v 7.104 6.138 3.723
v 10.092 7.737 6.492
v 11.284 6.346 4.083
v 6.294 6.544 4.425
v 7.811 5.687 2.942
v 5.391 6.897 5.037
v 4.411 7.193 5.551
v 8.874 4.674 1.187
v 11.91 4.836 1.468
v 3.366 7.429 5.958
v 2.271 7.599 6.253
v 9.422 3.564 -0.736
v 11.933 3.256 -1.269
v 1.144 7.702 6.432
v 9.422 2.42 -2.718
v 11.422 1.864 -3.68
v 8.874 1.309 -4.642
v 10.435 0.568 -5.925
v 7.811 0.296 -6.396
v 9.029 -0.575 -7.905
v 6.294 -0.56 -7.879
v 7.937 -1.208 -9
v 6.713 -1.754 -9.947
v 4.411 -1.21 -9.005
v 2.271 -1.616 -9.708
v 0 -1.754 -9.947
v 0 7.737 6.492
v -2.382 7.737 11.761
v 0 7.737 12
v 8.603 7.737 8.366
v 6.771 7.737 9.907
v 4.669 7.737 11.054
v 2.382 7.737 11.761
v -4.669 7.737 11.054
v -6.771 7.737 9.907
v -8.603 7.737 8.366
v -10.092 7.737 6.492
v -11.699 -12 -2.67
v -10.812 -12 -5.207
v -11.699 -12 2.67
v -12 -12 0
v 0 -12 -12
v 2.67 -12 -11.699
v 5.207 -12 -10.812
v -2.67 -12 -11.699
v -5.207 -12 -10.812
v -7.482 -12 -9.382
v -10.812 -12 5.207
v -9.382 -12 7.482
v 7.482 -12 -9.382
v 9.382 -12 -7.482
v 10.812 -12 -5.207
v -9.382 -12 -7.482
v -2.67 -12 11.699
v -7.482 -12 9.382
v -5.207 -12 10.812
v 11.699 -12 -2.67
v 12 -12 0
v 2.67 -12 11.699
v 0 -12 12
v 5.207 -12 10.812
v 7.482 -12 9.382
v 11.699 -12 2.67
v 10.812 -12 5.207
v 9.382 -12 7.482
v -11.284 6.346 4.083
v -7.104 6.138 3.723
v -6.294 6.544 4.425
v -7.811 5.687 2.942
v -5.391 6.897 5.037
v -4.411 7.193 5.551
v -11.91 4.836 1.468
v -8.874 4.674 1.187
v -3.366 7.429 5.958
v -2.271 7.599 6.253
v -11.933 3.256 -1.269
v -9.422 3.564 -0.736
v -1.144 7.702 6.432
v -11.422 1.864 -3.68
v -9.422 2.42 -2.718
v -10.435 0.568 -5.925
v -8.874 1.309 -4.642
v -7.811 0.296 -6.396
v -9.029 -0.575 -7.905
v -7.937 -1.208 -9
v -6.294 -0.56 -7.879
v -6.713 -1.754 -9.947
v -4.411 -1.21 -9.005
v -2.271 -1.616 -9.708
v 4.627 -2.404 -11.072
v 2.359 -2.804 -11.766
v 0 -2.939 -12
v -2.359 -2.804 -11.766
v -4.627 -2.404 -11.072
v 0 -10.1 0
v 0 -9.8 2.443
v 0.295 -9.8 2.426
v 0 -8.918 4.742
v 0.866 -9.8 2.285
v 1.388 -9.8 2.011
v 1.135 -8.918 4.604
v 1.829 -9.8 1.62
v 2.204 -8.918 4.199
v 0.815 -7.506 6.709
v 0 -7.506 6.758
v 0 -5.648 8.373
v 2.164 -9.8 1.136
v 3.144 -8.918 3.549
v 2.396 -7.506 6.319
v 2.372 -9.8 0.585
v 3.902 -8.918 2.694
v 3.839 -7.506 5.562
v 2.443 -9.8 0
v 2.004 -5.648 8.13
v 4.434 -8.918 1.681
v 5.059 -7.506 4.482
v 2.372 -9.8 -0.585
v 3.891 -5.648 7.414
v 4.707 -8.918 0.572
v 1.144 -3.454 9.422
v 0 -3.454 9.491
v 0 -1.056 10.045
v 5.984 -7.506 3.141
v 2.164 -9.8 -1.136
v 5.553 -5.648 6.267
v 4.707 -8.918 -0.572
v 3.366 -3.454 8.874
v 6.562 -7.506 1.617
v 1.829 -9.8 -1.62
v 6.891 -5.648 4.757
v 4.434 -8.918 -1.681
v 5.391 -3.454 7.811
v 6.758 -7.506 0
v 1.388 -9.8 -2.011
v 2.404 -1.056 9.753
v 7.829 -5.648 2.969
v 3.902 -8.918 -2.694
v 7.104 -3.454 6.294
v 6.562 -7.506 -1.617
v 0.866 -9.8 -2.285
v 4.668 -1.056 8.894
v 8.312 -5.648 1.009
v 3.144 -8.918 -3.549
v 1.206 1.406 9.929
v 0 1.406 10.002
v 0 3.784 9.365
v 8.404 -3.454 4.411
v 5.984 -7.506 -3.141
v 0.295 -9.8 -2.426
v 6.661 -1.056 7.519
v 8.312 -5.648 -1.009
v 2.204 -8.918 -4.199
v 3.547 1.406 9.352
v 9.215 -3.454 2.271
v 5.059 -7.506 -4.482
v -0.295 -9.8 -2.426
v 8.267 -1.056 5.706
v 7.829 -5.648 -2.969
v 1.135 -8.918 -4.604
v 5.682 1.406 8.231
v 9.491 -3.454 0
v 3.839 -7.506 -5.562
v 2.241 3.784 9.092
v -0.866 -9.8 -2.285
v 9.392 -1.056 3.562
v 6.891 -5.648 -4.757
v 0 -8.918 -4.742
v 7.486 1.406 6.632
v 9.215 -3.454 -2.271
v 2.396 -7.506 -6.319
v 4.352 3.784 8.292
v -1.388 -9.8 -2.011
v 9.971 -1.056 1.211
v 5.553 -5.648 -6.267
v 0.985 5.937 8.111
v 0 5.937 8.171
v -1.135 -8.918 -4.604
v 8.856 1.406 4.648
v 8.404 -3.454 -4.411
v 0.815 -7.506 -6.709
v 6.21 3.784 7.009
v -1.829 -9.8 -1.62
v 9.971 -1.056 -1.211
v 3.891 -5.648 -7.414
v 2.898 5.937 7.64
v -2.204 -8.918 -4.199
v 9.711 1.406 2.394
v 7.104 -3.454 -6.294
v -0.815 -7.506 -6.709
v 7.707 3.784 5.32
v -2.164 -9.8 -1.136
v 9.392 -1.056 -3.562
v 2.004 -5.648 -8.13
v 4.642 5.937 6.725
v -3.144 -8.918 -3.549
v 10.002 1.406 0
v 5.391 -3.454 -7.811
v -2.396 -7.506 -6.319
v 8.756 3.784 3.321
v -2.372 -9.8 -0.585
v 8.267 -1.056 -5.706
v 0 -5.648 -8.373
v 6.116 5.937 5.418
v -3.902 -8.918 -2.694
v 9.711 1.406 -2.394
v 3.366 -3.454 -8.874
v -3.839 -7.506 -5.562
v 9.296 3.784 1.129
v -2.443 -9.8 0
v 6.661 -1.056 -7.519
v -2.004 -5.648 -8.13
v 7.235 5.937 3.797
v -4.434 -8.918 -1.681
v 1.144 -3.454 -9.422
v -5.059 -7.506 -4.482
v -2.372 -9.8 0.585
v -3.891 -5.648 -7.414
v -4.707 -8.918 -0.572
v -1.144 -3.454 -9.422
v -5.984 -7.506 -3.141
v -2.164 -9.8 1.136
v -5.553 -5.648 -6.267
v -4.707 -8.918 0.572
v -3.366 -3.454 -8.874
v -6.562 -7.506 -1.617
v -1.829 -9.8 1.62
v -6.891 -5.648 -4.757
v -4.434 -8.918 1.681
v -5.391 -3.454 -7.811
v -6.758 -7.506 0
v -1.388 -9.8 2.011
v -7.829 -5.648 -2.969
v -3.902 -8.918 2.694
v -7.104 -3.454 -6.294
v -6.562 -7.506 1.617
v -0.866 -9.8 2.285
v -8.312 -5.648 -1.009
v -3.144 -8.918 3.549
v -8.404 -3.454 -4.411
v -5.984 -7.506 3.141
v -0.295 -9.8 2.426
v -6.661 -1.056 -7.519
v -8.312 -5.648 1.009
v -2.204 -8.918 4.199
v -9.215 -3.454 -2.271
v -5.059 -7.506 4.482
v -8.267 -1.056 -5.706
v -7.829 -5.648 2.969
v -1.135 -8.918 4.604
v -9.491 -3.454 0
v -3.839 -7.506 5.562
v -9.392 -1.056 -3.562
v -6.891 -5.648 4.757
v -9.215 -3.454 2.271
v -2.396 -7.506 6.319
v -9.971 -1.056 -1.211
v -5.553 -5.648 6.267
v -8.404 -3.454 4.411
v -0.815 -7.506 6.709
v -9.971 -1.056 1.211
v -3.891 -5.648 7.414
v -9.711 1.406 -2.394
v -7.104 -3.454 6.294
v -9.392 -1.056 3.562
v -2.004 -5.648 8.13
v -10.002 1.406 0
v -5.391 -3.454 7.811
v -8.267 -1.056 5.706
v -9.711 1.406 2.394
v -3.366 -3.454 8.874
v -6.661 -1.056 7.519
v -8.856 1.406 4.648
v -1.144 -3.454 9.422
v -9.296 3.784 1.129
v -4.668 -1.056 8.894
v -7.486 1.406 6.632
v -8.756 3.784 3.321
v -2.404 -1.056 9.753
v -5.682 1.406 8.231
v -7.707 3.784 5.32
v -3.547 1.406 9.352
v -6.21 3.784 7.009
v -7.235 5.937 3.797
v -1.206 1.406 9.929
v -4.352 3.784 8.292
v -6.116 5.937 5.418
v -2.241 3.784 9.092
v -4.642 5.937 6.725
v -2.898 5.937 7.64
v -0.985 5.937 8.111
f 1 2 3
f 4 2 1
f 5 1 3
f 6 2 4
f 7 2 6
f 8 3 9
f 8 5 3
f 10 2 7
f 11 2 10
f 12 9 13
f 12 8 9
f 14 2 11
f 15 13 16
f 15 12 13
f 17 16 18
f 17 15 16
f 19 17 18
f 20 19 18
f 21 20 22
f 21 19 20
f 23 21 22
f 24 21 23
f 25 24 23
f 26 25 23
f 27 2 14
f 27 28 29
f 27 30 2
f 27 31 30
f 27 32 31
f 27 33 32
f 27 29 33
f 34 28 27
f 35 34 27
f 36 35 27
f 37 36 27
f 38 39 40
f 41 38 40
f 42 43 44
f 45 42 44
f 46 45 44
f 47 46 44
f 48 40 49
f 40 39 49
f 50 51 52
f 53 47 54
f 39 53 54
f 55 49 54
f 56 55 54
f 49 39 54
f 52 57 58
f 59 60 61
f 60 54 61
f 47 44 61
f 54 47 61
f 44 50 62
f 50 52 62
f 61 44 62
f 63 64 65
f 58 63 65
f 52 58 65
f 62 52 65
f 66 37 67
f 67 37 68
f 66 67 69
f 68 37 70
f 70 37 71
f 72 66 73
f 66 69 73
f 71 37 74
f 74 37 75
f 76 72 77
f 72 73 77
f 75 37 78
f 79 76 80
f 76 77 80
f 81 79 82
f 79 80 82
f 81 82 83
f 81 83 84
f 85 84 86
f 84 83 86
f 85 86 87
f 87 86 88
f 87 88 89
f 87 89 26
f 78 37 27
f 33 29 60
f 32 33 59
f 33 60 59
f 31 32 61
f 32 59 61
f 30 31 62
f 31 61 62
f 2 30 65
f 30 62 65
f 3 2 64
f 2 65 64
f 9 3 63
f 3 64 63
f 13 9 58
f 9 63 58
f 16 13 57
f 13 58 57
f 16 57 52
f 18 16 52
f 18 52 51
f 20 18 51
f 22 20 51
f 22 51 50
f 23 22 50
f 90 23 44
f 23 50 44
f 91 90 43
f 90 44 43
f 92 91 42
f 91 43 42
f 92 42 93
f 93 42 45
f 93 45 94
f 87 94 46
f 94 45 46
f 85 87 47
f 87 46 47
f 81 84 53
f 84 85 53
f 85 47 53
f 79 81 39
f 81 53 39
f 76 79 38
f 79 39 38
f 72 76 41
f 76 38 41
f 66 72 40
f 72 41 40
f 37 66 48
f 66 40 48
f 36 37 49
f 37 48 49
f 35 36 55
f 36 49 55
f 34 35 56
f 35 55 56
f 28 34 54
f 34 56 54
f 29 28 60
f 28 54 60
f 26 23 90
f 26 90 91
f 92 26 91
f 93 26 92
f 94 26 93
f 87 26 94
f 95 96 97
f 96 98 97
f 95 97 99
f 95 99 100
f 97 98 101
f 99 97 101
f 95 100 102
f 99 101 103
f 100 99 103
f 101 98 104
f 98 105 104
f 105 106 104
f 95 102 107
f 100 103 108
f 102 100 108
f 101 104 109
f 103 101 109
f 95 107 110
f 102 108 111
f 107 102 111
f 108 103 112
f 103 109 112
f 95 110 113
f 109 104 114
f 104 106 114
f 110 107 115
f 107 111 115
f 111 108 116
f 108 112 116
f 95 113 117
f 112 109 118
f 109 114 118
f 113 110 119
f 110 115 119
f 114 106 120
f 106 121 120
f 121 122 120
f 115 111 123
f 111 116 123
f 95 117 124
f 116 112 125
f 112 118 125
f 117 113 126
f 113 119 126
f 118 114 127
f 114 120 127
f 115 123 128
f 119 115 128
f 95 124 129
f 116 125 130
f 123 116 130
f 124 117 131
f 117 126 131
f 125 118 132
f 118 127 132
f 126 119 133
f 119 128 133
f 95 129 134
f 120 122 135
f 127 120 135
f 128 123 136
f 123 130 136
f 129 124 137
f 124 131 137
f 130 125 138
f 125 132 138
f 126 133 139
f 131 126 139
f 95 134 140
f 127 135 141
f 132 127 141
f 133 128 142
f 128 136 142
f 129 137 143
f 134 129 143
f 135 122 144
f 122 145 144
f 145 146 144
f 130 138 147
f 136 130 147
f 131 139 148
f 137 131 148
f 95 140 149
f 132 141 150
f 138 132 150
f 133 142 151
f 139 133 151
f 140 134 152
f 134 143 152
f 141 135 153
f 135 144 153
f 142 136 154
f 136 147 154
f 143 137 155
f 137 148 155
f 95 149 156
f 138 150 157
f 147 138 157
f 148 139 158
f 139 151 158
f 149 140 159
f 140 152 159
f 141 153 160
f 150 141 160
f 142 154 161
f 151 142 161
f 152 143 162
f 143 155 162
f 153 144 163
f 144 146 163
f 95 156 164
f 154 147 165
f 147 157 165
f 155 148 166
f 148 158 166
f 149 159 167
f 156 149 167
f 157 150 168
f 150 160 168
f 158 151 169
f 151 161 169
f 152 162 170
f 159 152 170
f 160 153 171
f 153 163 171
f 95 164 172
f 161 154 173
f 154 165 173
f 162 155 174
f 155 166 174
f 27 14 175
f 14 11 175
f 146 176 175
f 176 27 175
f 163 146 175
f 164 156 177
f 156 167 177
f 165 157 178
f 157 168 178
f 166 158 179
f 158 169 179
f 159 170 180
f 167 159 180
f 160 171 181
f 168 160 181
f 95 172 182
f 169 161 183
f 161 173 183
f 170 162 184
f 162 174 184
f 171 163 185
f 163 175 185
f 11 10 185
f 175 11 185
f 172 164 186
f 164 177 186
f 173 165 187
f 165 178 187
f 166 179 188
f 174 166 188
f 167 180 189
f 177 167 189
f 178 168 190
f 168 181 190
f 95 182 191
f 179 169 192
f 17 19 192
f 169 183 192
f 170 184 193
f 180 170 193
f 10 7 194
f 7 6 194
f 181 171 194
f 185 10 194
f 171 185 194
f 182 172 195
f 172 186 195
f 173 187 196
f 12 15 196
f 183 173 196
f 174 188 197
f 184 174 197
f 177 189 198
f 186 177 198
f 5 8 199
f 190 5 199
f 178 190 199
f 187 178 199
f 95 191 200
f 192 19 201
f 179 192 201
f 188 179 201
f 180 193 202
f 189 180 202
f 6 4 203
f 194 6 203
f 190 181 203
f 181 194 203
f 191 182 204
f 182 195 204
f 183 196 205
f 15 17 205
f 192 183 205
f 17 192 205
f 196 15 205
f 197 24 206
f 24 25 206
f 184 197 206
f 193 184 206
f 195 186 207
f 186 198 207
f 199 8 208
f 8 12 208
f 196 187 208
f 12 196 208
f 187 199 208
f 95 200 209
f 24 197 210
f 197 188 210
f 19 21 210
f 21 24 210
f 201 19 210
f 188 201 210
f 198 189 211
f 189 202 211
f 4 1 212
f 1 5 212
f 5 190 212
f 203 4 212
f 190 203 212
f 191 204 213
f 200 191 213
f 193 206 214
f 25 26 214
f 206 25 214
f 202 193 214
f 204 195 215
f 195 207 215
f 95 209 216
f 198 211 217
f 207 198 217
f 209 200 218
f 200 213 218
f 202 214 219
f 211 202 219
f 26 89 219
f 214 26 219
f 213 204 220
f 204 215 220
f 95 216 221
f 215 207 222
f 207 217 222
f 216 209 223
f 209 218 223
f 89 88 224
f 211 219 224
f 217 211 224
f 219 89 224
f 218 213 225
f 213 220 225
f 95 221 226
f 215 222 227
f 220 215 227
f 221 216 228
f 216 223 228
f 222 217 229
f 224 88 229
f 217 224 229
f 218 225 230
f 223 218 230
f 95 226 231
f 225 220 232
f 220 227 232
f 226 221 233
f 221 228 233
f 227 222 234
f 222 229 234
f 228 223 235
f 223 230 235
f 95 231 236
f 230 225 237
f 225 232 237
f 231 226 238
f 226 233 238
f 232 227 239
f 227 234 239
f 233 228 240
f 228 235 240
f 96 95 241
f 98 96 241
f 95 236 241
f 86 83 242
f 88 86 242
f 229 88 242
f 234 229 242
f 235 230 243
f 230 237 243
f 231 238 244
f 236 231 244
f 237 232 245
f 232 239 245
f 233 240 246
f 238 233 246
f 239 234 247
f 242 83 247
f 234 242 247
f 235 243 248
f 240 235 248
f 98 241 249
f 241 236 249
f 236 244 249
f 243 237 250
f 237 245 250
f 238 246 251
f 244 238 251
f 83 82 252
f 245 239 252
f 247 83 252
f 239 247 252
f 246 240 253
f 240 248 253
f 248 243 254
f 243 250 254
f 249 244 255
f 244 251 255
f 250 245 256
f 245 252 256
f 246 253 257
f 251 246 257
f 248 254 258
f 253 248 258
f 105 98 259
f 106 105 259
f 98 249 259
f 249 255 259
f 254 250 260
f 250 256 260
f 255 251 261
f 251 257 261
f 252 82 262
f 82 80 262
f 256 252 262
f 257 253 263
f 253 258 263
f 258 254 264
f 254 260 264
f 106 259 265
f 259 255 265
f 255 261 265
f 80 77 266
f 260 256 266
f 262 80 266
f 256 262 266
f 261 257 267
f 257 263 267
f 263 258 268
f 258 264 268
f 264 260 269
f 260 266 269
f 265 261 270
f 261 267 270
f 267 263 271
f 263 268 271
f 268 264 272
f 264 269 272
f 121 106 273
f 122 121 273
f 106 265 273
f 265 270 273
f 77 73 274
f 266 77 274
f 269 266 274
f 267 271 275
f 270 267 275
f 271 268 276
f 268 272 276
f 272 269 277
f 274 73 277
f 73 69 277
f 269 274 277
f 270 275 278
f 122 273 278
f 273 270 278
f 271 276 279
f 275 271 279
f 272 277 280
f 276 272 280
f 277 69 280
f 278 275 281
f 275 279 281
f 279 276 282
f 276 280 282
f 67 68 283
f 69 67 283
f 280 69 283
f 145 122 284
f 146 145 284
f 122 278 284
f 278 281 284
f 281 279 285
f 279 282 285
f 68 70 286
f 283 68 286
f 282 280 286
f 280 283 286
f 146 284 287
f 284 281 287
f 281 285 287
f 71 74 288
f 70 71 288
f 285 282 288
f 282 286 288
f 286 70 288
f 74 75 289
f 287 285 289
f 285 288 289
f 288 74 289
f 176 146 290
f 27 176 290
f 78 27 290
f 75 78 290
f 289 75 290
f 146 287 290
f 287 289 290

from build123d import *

# Parameters (mm, degrees)
CUT_EXTRUDE1_DEPTH      = 13
CUT_EXTRUDE1_DEPTH_BACK = 13


with BuildPart() as part:
    # Sketch1 → Revolve1 (revolve)
    with BuildSketch(Plane(origin=(0, 0, 0), x_dir=(0, 0, -1), z_dir=(1, 0, 0))):
        with BuildLine():
            Line((-5.05, 8.746856578), (-12, 8.746856578))
            Line((-12, 8.746856578), (-12, -12))
            Line((-12, -12), (0, -12))
            Line((0, -12), (0, -10.1))
            ThreePointArc((0, -10.1), (-9.755850846, -2.614072356), (-5.05, 8.746856578))
        make_face()
    revolve(axis=Axis((0, -12, 0), (0, 1, 0)))

    # Sketch2 → Cut-Extrude1 (cut, two sides)
    with BuildSketch(Plane(origin=(0, 0, 0), x_dir=(0, 0, -1), z_dir=(1, 0, 0))) as cut_extrude1_sk:
        Polygon((-6.492154858, 7.737048876), (9.946558305, -1.753846594), (12, -2.93940171), (12, 8.746856578), (-12, 8.746856578), (-12, 7.737048876), align=None)
    extrude(amount=CUT_EXTRUDE1_DEPTH, mode=Mode.SUBTRACT)
    extrude(cut_extrude1_sk.sketch, amount=-CUT_EXTRUDE1_DEPTH_BACK, mode=Mode.SUBTRACT)


solid = part.part
